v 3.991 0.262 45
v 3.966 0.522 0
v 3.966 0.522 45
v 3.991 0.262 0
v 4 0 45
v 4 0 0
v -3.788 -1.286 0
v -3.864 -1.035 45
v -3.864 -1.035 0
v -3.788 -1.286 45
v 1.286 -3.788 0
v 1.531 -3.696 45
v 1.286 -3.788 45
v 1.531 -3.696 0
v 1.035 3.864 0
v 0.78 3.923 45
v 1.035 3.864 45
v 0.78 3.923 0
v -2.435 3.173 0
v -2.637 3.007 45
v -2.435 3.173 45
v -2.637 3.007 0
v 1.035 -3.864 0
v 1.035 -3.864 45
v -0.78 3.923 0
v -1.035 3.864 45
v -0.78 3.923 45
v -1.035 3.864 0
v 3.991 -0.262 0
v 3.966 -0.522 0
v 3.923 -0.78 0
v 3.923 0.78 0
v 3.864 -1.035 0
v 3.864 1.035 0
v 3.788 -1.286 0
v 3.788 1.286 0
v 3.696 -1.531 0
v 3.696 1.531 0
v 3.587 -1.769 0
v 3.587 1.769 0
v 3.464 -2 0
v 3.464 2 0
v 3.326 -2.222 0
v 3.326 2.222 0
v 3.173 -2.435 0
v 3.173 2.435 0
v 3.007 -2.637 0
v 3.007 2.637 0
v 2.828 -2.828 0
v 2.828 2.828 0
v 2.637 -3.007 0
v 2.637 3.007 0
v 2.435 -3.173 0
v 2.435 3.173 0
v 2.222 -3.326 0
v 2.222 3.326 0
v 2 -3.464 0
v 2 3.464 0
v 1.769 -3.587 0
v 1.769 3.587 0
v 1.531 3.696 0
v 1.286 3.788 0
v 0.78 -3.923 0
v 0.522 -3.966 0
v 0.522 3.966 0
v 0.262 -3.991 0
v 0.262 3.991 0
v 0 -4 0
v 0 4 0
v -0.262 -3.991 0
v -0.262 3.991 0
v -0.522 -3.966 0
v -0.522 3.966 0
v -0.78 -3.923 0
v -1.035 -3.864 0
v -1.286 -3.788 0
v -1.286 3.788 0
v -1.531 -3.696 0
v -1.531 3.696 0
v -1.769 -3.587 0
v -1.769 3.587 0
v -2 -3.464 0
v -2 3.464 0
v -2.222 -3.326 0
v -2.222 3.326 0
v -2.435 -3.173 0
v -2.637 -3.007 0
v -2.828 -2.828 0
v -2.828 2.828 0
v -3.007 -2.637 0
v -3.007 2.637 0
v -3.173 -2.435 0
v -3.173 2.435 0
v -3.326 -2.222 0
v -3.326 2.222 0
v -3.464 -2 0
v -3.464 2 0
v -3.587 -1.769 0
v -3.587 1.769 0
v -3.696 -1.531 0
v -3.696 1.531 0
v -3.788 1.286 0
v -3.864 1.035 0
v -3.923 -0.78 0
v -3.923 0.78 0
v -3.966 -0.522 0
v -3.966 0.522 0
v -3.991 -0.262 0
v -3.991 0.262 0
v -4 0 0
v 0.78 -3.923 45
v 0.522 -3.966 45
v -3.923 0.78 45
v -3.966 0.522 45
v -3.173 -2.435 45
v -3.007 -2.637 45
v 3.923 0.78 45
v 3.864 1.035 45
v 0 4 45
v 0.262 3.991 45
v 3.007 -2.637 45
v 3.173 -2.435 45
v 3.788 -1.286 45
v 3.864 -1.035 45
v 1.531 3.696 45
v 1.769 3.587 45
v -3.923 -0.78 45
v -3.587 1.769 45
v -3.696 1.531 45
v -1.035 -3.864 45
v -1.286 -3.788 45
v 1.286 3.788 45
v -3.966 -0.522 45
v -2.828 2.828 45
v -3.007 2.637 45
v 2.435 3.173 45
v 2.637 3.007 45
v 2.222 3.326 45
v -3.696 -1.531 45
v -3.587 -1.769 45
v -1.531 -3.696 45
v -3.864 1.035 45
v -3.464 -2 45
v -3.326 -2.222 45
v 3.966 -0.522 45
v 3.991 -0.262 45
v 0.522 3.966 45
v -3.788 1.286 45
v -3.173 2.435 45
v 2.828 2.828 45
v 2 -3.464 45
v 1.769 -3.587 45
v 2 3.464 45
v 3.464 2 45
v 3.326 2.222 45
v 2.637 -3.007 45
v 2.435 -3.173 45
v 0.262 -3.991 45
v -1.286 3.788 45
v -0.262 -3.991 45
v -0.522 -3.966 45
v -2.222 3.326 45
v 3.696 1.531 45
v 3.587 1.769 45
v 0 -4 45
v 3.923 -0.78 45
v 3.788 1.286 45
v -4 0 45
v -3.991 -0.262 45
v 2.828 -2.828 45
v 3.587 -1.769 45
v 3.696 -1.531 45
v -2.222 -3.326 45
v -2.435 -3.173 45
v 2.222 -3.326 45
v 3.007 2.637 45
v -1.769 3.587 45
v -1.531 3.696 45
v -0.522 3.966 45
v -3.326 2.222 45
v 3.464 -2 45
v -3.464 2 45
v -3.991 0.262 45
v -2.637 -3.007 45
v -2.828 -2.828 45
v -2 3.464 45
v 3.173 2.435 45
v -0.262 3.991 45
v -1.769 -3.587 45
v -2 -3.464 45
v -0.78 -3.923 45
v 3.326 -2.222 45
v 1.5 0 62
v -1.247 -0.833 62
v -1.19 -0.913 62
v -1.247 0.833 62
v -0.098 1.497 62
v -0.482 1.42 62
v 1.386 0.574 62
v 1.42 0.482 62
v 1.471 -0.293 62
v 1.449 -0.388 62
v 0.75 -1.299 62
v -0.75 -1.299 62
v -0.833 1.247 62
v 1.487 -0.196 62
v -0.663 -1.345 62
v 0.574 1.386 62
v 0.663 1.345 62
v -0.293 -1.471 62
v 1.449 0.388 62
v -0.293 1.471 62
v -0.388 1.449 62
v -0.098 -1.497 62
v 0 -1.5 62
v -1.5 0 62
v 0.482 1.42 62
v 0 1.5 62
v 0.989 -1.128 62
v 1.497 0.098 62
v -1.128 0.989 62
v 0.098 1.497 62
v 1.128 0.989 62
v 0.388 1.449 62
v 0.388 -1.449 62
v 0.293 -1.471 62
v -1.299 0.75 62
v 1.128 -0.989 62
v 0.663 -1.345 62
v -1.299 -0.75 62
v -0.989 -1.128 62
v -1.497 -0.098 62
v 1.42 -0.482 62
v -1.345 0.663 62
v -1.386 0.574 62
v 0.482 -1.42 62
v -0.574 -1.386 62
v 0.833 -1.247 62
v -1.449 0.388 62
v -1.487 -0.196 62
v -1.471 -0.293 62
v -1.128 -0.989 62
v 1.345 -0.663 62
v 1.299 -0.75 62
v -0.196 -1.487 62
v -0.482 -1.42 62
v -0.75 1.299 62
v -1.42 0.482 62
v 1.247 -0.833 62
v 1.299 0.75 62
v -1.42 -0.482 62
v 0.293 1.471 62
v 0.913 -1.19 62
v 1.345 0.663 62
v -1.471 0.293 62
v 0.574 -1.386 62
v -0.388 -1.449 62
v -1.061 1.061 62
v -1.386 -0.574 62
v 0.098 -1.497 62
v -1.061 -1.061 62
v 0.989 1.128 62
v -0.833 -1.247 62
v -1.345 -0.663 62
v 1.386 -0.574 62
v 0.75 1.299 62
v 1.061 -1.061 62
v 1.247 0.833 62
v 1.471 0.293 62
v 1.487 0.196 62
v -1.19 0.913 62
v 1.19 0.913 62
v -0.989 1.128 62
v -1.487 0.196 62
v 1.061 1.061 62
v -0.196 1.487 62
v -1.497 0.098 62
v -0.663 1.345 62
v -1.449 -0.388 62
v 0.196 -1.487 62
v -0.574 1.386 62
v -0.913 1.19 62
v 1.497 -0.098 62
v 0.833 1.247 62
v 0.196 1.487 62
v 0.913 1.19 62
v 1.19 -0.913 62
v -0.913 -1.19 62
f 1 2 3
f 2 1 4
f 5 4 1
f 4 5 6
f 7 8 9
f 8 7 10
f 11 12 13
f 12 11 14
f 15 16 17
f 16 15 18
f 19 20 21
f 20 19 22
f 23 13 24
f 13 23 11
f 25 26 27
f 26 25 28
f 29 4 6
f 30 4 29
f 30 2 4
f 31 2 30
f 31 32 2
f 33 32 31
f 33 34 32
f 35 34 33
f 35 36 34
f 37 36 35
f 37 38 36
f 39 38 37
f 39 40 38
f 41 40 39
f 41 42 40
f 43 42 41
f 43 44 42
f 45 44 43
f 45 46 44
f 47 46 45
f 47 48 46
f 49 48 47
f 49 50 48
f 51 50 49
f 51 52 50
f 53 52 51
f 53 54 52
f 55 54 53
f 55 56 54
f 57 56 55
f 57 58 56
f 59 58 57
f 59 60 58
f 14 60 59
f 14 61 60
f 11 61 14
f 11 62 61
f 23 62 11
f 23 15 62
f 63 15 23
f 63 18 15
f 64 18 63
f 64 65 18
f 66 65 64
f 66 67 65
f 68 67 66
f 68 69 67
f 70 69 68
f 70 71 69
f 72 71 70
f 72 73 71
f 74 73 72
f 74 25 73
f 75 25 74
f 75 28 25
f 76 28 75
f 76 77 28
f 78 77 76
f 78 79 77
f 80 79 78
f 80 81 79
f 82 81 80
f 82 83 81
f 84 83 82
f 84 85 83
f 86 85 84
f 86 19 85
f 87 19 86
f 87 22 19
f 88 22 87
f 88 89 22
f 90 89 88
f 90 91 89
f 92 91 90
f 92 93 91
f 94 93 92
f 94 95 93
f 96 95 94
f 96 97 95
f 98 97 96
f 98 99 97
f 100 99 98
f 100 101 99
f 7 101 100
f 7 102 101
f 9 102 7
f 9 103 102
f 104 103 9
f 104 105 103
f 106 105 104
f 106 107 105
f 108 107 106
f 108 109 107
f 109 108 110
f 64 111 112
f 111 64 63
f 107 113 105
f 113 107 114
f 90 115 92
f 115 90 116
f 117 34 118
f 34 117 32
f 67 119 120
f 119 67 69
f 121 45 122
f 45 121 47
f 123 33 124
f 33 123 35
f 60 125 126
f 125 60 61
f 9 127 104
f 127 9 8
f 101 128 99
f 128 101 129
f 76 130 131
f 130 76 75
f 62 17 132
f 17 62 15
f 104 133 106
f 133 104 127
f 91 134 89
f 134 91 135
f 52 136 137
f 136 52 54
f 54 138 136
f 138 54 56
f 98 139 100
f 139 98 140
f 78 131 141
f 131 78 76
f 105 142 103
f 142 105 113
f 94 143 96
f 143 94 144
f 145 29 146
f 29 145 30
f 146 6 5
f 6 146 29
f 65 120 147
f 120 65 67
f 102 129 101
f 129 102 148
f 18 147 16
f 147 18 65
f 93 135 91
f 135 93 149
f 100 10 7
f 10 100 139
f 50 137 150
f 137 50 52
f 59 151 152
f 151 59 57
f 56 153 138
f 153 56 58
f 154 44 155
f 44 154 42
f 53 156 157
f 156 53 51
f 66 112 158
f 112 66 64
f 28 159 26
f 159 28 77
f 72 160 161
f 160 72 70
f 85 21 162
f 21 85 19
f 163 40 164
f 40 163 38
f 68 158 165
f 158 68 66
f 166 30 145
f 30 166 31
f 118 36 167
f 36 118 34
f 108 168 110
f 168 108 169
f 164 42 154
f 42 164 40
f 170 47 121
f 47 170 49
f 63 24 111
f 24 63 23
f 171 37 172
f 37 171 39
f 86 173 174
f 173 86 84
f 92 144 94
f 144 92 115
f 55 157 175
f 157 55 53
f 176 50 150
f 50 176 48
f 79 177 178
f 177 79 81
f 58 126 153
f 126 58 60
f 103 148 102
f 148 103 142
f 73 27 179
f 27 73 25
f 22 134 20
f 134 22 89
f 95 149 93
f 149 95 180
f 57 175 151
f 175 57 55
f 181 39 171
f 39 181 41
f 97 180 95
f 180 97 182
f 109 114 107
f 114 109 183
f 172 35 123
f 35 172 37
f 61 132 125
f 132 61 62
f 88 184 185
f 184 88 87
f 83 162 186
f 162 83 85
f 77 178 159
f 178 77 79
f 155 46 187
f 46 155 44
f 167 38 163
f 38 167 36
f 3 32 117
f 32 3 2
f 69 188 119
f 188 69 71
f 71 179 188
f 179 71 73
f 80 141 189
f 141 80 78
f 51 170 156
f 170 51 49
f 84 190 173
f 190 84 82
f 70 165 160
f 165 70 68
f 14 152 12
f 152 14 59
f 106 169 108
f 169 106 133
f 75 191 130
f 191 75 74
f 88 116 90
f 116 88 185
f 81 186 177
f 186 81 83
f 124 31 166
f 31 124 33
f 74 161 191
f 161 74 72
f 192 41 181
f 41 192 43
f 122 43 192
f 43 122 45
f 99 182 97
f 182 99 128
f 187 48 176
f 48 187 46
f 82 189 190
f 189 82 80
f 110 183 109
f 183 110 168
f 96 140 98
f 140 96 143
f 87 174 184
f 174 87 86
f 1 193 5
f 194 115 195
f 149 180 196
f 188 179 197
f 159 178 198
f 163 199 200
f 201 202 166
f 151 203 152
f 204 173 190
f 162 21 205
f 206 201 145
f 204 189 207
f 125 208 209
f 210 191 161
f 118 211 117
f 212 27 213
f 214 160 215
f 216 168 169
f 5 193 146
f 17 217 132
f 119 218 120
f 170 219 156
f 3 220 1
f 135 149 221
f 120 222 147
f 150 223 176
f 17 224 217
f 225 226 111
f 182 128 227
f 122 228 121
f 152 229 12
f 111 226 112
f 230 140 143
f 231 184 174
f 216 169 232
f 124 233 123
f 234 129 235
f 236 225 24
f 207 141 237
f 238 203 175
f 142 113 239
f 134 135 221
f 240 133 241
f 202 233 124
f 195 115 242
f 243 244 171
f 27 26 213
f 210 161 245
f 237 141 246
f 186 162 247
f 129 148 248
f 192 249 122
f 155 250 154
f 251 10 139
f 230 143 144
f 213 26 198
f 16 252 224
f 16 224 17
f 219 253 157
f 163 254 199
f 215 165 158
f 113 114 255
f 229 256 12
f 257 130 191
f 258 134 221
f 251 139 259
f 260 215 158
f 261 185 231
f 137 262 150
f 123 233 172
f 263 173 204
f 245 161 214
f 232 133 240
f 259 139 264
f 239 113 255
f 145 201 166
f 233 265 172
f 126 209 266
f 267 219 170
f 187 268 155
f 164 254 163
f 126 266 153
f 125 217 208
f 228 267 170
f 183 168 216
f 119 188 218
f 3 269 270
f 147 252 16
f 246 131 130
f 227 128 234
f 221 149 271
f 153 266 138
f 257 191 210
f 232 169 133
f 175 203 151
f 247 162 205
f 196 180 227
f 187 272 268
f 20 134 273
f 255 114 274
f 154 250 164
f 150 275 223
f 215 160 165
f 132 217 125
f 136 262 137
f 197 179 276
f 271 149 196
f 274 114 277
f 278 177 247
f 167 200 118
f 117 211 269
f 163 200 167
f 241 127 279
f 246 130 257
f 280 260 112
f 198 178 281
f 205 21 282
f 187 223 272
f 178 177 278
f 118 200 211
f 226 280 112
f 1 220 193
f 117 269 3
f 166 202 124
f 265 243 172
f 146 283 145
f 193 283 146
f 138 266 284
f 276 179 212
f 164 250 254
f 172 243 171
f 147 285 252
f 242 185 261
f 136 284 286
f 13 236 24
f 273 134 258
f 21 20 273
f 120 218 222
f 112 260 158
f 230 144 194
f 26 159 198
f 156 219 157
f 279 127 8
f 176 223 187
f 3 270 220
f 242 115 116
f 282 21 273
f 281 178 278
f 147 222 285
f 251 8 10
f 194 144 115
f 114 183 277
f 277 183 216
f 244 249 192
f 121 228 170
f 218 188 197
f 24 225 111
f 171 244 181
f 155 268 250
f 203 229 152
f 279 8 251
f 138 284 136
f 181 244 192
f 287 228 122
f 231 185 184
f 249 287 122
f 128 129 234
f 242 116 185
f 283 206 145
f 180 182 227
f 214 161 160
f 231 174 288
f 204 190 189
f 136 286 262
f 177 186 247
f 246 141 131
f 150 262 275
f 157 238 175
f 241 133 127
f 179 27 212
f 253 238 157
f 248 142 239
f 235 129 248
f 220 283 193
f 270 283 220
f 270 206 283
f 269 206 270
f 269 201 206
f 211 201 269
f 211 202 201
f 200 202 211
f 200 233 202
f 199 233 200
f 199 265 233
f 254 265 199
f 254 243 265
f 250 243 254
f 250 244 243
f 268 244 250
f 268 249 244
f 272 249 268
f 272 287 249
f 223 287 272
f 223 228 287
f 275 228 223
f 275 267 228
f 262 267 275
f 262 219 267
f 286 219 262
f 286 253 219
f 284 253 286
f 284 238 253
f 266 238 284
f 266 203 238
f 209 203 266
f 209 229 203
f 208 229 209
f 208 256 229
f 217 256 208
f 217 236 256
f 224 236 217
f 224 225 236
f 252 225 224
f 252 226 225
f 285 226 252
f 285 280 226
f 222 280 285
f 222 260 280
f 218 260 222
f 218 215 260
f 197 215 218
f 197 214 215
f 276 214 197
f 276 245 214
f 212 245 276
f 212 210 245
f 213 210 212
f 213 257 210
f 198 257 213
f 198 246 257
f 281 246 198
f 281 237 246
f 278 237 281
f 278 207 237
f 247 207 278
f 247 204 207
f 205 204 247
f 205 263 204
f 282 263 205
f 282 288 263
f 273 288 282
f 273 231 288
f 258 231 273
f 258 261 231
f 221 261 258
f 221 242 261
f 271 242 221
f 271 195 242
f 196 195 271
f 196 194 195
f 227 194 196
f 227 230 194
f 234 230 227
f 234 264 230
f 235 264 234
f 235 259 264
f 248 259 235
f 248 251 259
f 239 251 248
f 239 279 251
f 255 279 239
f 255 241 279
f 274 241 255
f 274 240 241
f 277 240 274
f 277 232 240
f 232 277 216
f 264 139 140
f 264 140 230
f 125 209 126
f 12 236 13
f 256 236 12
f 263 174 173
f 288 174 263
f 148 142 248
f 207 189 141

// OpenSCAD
// Pestle for 1.5 mL microcentrifuge tube
// Print orientation: standing upright, handle on the bed

// ---- Dimensions (mm) ----
handle_d      = 8;     // handle diameter
handle_h      = 45;    // handle height (z = 0 to 45)
cone_start_d  = 8;     // cone diameter at z = 45
cone_end_d    = 3;     // cone diameter at z = 62
cone_h        = 17;    // cone height (62 - 45)
tip_d         = 3;     // tip sphere diameter
tip_z         = 62;    // tip sphere centre height
groove_w      = 2;     // groove width (Z)
groove_depth  = 1;     // groove depth from surface
groove_z      = [10, 15, 20, 25]; // groove centre heights
overcut       = 0.5;   // cutter overshoot past faces

$fn = 96;

// ---- Model ----
union() {
    // Handle
    cylinder(d = handle_d, h = handle_h);

    // Cone (tapered from 8 mm to 3 mm)
    translate([0, 0, handle_h])
        cylinder(d1 = cone_start_d, d2 = cone_end_d, h = cone_h);

    // Rounded tip (sphere centred at z = 62)
    translate([0, 0, tip_z - tip_d / 2])
        sphere(d = tip_d);
}

// ---- Grip grooves ----
for (z = groove_z)
    translate([0, 0, z - groove_w / 2])
        cylinder(d = groove_depth * 2, h = groove_w, $fn = 64);
